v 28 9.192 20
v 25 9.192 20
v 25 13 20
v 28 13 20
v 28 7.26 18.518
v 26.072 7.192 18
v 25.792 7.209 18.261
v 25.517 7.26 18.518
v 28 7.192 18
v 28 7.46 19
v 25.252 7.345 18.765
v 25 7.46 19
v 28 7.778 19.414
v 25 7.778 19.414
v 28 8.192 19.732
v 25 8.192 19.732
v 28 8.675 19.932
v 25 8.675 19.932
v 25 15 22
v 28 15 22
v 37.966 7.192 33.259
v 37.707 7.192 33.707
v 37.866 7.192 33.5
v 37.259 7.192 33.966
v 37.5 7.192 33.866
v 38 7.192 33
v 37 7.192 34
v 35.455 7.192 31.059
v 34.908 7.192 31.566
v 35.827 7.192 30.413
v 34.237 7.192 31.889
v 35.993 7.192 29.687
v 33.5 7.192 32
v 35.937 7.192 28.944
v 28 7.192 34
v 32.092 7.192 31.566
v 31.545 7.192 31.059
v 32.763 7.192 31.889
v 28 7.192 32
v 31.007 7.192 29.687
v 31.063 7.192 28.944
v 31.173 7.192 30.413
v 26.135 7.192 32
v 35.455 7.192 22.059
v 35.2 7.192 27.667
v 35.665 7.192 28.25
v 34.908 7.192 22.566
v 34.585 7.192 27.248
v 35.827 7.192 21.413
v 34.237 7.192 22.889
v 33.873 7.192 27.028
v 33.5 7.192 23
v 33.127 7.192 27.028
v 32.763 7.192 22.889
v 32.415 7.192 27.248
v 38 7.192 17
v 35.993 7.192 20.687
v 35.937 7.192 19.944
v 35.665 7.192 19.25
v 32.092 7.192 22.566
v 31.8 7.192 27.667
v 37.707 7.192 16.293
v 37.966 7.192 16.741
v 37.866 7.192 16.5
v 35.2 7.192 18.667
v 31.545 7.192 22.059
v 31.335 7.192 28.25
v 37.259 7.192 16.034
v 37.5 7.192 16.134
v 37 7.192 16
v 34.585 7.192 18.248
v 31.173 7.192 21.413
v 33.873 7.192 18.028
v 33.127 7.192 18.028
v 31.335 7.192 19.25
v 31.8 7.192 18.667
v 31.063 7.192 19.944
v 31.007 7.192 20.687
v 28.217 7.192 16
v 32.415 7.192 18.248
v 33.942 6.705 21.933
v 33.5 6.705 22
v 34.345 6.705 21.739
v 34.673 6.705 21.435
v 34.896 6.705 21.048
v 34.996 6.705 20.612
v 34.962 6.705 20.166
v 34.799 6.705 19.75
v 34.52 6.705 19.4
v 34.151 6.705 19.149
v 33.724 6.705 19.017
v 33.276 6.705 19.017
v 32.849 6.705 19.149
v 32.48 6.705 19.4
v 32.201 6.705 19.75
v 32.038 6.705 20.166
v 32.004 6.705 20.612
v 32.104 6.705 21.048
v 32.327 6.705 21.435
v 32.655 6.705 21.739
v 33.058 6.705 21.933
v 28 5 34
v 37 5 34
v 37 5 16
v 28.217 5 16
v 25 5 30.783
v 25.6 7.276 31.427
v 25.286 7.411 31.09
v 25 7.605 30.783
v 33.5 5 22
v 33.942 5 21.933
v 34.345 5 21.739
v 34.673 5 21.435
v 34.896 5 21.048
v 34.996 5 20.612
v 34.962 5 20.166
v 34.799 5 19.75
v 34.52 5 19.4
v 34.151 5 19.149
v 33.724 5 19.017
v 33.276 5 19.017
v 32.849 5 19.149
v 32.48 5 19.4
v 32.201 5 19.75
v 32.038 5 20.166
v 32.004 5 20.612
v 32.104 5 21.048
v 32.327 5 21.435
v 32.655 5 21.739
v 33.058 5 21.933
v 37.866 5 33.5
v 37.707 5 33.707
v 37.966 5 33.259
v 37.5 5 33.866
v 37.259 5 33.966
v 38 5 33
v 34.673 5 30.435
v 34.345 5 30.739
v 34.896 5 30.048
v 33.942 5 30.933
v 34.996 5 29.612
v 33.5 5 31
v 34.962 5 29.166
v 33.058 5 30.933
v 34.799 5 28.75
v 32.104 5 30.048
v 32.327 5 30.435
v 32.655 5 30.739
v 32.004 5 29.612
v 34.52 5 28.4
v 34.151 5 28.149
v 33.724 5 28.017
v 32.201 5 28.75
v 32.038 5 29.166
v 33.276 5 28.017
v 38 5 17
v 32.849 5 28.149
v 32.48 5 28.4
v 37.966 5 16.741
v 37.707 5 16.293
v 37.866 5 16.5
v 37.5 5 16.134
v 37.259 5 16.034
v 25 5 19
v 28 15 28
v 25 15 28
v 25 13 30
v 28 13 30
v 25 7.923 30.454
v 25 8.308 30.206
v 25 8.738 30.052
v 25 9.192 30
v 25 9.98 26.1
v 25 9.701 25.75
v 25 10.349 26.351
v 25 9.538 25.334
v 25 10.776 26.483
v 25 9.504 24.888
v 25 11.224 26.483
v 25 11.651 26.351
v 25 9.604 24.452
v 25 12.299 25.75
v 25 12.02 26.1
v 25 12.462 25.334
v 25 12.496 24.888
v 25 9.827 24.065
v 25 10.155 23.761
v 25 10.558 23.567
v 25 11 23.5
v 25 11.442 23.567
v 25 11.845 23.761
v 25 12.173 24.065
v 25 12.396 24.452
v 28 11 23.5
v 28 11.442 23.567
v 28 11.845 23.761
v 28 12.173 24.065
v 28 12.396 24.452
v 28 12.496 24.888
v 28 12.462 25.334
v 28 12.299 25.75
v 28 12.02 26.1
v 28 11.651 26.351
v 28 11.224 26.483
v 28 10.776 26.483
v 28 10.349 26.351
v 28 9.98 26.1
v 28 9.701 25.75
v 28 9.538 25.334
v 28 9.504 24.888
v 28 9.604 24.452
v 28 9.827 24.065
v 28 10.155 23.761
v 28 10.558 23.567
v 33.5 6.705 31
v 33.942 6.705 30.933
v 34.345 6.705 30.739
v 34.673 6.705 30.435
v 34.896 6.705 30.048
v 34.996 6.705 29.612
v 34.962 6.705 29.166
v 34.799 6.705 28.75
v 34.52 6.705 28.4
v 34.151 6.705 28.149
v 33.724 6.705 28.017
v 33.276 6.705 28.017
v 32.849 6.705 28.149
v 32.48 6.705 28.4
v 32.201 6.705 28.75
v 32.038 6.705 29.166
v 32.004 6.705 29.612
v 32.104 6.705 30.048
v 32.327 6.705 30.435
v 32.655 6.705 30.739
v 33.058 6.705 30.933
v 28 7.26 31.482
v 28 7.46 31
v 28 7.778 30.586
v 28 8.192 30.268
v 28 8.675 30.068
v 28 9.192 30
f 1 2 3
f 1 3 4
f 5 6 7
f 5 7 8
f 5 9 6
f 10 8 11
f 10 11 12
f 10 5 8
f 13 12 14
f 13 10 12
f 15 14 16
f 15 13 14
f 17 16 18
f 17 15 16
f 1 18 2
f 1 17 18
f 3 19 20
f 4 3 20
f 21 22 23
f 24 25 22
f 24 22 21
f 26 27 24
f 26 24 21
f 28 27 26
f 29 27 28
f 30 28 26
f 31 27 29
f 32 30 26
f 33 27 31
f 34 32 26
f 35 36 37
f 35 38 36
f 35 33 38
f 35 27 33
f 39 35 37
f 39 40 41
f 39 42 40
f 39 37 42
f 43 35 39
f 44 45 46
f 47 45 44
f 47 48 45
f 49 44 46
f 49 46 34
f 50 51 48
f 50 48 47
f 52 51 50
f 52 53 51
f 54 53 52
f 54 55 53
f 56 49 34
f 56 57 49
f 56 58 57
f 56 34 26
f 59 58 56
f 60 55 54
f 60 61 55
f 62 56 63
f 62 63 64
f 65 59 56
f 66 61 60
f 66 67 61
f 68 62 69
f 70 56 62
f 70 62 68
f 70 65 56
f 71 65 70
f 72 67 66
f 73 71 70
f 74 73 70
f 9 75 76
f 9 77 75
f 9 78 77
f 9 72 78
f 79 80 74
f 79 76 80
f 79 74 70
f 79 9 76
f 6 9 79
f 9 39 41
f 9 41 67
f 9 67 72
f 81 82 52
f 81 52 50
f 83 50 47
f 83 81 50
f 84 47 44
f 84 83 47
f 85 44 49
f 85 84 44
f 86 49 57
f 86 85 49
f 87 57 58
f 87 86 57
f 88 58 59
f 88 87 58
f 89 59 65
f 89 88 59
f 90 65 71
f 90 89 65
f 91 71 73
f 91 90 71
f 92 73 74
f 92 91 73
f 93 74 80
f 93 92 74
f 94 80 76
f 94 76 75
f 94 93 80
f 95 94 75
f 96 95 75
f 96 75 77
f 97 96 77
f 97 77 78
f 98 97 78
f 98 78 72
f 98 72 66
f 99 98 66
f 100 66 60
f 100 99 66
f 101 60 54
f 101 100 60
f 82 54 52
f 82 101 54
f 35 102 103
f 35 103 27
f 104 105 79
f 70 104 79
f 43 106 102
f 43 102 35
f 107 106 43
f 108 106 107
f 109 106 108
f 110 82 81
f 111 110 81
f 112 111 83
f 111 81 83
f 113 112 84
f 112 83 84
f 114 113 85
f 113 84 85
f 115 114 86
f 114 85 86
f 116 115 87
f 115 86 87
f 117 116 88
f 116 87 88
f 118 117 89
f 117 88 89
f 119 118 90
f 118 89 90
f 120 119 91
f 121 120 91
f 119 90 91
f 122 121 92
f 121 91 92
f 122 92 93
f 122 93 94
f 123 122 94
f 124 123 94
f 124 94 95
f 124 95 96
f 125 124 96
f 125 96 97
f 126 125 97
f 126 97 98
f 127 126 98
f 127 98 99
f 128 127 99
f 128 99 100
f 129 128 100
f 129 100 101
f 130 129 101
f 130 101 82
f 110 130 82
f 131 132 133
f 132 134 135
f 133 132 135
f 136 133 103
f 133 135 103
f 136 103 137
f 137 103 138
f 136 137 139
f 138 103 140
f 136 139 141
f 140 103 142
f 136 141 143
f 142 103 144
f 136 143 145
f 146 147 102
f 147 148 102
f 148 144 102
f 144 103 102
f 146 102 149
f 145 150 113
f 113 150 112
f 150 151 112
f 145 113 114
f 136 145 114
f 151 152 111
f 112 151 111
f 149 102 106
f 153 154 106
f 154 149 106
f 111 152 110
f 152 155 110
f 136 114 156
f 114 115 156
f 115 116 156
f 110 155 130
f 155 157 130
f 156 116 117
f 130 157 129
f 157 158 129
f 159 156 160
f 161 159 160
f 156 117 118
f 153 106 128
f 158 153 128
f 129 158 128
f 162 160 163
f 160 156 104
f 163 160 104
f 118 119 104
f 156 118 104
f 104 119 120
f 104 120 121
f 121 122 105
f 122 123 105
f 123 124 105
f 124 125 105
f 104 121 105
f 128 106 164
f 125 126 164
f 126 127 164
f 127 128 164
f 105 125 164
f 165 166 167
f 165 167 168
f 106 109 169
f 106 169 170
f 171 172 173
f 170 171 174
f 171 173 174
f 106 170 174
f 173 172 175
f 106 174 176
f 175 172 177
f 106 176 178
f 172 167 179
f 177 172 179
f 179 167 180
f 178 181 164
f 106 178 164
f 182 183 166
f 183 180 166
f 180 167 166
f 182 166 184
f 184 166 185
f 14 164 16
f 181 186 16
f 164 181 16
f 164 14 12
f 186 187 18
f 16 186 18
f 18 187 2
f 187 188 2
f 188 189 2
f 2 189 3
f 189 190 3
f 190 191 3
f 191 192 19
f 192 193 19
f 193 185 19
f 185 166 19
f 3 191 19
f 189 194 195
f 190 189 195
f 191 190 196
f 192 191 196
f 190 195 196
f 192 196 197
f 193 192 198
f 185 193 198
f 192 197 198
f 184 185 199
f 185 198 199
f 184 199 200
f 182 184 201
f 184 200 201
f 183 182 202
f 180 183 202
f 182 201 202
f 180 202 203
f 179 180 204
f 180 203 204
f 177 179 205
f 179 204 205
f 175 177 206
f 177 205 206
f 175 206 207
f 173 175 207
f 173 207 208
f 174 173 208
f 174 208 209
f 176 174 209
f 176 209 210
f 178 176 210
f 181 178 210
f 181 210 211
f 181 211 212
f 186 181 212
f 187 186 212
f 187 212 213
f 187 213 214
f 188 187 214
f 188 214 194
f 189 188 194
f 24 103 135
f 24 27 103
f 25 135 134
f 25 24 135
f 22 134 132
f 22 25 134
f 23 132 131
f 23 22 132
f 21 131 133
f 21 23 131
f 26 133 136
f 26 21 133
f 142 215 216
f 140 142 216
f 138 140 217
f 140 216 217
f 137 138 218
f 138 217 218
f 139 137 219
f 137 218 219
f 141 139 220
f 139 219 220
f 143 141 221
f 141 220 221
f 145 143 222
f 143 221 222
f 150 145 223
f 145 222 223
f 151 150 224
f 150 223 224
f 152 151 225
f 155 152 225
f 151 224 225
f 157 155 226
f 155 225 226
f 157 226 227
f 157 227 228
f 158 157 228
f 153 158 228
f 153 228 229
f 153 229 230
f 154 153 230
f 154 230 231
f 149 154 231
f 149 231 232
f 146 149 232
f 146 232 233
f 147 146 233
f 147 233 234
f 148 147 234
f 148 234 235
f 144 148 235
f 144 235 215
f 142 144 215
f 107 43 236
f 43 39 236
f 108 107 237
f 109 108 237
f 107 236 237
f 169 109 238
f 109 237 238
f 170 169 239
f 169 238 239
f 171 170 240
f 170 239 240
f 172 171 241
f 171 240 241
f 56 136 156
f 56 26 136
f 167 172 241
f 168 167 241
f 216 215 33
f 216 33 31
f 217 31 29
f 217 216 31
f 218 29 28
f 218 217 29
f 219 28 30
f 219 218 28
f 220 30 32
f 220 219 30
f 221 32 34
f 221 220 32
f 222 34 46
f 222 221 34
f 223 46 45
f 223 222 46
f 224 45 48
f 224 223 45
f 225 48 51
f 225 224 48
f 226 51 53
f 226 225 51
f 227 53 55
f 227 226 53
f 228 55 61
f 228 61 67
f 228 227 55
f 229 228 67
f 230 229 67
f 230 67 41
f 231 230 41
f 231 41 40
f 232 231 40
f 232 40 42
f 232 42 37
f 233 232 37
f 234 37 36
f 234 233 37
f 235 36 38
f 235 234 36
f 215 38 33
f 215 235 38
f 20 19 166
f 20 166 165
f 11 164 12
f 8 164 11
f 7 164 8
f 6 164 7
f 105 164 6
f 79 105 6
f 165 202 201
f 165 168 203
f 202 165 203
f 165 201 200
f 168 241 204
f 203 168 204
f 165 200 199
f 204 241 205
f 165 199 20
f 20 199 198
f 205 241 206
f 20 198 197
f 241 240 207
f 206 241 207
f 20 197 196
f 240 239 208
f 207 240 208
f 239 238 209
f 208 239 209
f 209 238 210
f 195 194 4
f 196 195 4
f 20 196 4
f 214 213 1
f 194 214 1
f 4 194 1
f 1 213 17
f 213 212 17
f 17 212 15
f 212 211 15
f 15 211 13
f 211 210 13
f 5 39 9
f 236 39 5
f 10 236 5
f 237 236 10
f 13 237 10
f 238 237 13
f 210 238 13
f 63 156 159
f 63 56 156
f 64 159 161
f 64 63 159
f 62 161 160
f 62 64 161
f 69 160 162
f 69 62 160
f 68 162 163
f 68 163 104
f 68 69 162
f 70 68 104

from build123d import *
from OCP.BRepFilletAPI import BRepFilletAPI_MakeChamfer

# Parameters (mm, degrees)
SKETCH1_W                = 70
SKETCH1_H                = 150
BOSS_EXTRUDE1_DEPTH      = 5
SKETCH2_W                = 4
SKETCH2_H                = 15
BOSS_EXTRUDE2_DEPTH      = 15
BOSS_EXTRUDE3_REACH      = 89.321
SKETCH3_R                = 3
CHAMFER1_SIZE            = 4
CHAMFER2_SIZE            = 4
CHAMFER3_SIZE            = 4
CHAMFER4_SIZE            = 10
CHAMFER5_SIZE            = 20
SKETCH4_W                = 3
SKETCH4_H                = 10
BOSS_EXTRUDE4_DEPTH      = 10
CHAMFER6_SIZE            = 2
SKETCH5_R                = 1.5
CUT_EXTRUDE1_DEPTH       = 100.969995499
CUT_EXTRUDE2_DEPTH       = 106
BOSS_EXTRUDE5_DEPTH      = 10
BOSS_EXTRUDE5_DEPTH_BACK = 3
SKETCH7_W                = 18
SKETCH7_H                = 2.192346064
CHAMFER7_SIZE            = 3
CHAMFER7_SIZE2           = 3.21710613
FILLET1_R                = 2
SKETCH8_R                = 1.5
CUT_EXTRUDE3_DEPTH       = 10
CHAMFER8_SIZE            = 1
CHAMFER8_SIZE2           = 0.487732589
FILLET2_R                = 1
SKETCH9_W                = 23.659390011
SKETCH9_H                = 22.018276252
CUT_EXTRUDE4_DEPTH       = 20


with BuildPart() as part:
    # Sketch1 → Boss-Extrude1 (new body)
    with BuildSketch(Plane(origin=(0, 0, 0), x_dir=(1, 0, 0), z_dir=(0, 1, 0))):
        Rectangle(SKETCH1_W, SKETCH1_H)
    extrude(amount=BOSS_EXTRUDE1_DEPTH)

    # Sketch2 → Boss-Extrude2 (add)
    with BuildSketch(Plane(origin=(0, 5, 0), x_dir=(1, 0, 0), z_dir=(0, 1, 0))):
        with Locations((-7, 62.5)):
            Rectangle(SKETCH2_W, SKETCH2_H)
        with Locations((7, 62.5)):
            Rectangle(SKETCH2_W, SKETCH2_H)
    extrude(amount=BOSS_EXTRUDE2_DEPTH)

    # Sketch3 → Boss-Extrude3 (add, up to next)
    with BuildSketch(Plane(origin=(-5, 0, 0), x_dir=(0, 0, -1), z_dir=(1, 0, 0)), mode=Mode.PRIVATE) as boss_extrude3_sk1:
        with Locations(Location((62.5, 12.5, 0), (0, 0, 180))):
            Circle(SKETCH3_R)
    boss_extrude3_tool1 = extrude(boss_extrude3_sk1.sketch, amount=BOSS_EXTRUDE3_REACH, mode=Mode.PRIVATE) - part.part
    add(boss_extrude3_tool1.solids().sort_by_distance((-5, 12.5, -62.5))[0])

    # Chamfer1
    chamfer1_edges = [part.edges().sort_by_distance(p)[0] for p in [
        (-7, 20, -70),
        (-7, 20, -55),
        (7, 20, -70),
        (7, 20, -55),
    ]]
    chamfer(chamfer1_edges, length=CHAMFER1_SIZE)

    # Chamfer2
    chamfer2_edges = [part.edges().sort_by_distance(p)[0] for p in [
        (-7, 5, -70),
        (-7, 5, -55),
        (7, 5, -70),
        (7, 5, -55),
    ]]
    chamfer(chamfer2_edges, length=CHAMFER2_SIZE)

    # Chamfer3
    chamfer3_edges = [part.edges().sort_by_distance(p)[0] for p in [
        (9, 5, -62.5),
        (-9, 5, -62.5),
    ]]
    chamfer(chamfer3_edges, length=CHAMFER3_SIZE)

    # Chamfer4
    chamfer4_edges = [part.edges().sort_by_distance(p)[0] for p in [
        (-35, 2.5, -75),
        (35, 2.5, -75),
    ]]
    chamfer(chamfer4_edges, length=CHAMFER4_SIZE)

    # Chamfer5
    chamfer5_edges = [part.edges().sort_by_distance(p)[0] for p in [
        (35, 2.5, 75),
        (-35, 2.5, 75),
    ]]
    chamfer(chamfer5_edges, length=CHAMFER5_SIZE)

    # Sketch4 → Boss-Extrude4 (add)
    with BuildSketch(Plane(origin=(0, 5, 0), x_dir=(1, 0, 0), z_dir=(0, 1, 0))):
        with Locations((26.5, -25)):
            Rectangle(SKETCH4_W, SKETCH4_H)
        with Locations((-26.5, -25)):
            Rectangle(SKETCH4_W, SKETCH4_H)
    extrude(amount=BOSS_EXTRUDE4_DEPTH)

    # Chamfer6
    chamfer6_edges = [part.edges().sort_by_distance(p)[0] for p in [
        (26.5, 15, 20),
        (26.5, 15, 30),
        (-26.5, 15, 20),
        (-26.5, 15, 30),
    ]]
    chamfer(chamfer6_edges, length=CHAMFER6_SIZE)

    # Sketch5 → Cut-Extrude1 (cut, through all)
    with BuildSketch(Plane(origin=(28, 0, 0), x_dir=(0, 0, -1), z_dir=(1, 0, 0))):
        with Locations((-25, 11)):
            Circle(SKETCH5_R)
    extrude(amount=-CUT_EXTRUDE1_DEPTH, mode=Mode.SUBTRACT)

    # Sketch6 → Cut-Extrude2 (cut)
    with BuildSketch(Plane(origin=(35, 0, 0), x_dir=(0, 0, -1), z_dir=(1, 0, 0))):
        Polygon((-75, 5), (44.602239444, 5), (44.602239444, 35.253881219), (84.386815395, 35.253881219), (84.386815395, 5), (84.386815395, -21.159404211), (-75, -21.159404211), align=None)
    extrude(amount=-CUT_EXTRUDE2_DEPTH, mode=Mode.SUBTRACT)


with BuildPart() as cut_extrude2_piece_1:
    # of the separate pieces the step leaves, piece 1, a body of its own (cut_extrude2_pieces)
    add(part.part.solids().sort_by_distance((-25, 13, 20))[0])

    # Sketch9 → Cut-Extrude4 (cut)
    with BuildSketch(Plane(origin=(0, 0, 16), x_dir=(-1, 0, 0), z_dir=(0, 0, -1))):
        with Locations((24.129769204, 9.145253251)):
            Rectangle(SKETCH9_W, SKETCH9_H)
    extrude(amount=-CUT_EXTRUDE4_DEPTH, mode=Mode.SUBTRACT)


with BuildPart() as cut_extrude2_piece_2:
    # of the separate pieces the step leaves, piece 2, a body of its own (cut_extrude2_pieces)
    add(part.part.solids().sort_by_distance((25, 13, 20))[0])

    # Sketch7 → Boss-Extrude5 (add, two sides: drawn at the far end of the back side and taken through both)
    with BuildSketch(Plane(origin=(28, 0, 0), x_dir=(0, 0, -1), z_dir=(1, 0, 0)).offset(-BOSS_EXTRUDE5_DEPTH_BACK)):
        with Locations((-25, 6.096173032)):
            Rectangle(SKETCH7_W, SKETCH7_H)
    extrude(amount=BOSS_EXTRUDE5_DEPTH + BOSS_EXTRUDE5_DEPTH_BACK)

    # Chamfer7: one chamfer whose edges measure the first distance from different faces: ONE call of the kernel's chamfer builder (chamfer() names one face for all edges)
    chamfer7_edges_1 = [cut_extrude2_piece_2.edges().sort_by_distance(p)[0] for p in [
        (25, 6.096173032, 34),
    ]]
    chamfer7_side_1 = [cut_extrude2_piece_2.faces().sort_by_distance(p)[0] for p in [
        (31.5, 6.096173032, 34),
    ]]
    chamfer7_edges_2 = [cut_extrude2_piece_2.edges().sort_by_distance(p)[0] for p in [
        (25, 6.096173032, 16),
    ]]
    chamfer7_side_2 = [cut_extrude2_piece_2.faces().sort_by_distance(p)[0] for p in [
        (25, 9.127734828, 25),
    ]]
    chamfer7 = BRepFilletAPI_MakeChamfer(cut_extrude2_piece_2.part.solid().wrapped)
    for e in chamfer7_edges_1:
        chamfer7.Add(CHAMFER7_SIZE, CHAMFER7_SIZE2, e.wrapped, chamfer7_side_1[0].wrapped)  # the first distance lies on this face
    for e in chamfer7_edges_2:
        chamfer7.Add(CHAMFER7_SIZE, CHAMFER7_SIZE2, e.wrapped, chamfer7_side_2[0].wrapped)  # the first distance lies on this face
    add(Compound.cast(chamfer7.Shape()), mode=Mode.REPLACE)

    # Fillet1
    fillet1_edges = [cut_extrude2_piece_2.edges().sort_by_distance(p)[0] for p in [
        (26.5, 7.192346064, 30),
        (26.5, 7.192346064, 20),
    ]]
    fillet(fillet1_edges, radius=FILLET1_R)

    # Sketch8 → Cut-Extrude3 (cut)
    with BuildSketch(Plane(origin=(0, 7.192346064, 0), x_dir=(1, 0, 0), z_dir=(0, 1, 0))):
        with Locations(Location((33.5, -20.5, 0), (0, 0, 270))):
            Circle(SKETCH8_R)
        with Locations(Location((33.5, -29.5, 0), (0, 0, 270))):
            Circle(SKETCH8_R)
    extrude(amount=-CUT_EXTRUDE3_DEPTH, mode=Mode.SUBTRACT)

    # Chamfer8
    chamfer8_edges = [cut_extrude2_piece_2.edges().sort_by_distance(p)[0] for p in [
        (33.5, 7.192346064, 19),
        (33.5, 7.192346064, 28),
    ]]
    chamfer8_side = [cut_extrude2_piece_2.faces().sort_by_distance(p)[0] for p in [
        (32.839348065, 7.192346064, 25.007845187),
    ]]
    chamfer(chamfer8_edges, length=CHAMFER8_SIZE, length2=CHAMFER8_SIZE2, reference=chamfer8_side[0])

    # Fillet2
    fillet2_edges = [cut_extrude2_piece_2.edges().sort_by_distance(p)[0] for p in [
        (38, 6.096173032, 34),
        (38, 6.096173032, 16),
    ]]
    fillet(fillet2_edges, radius=FILLET2_R)


solid = cut_extrude2_piece_2.part
